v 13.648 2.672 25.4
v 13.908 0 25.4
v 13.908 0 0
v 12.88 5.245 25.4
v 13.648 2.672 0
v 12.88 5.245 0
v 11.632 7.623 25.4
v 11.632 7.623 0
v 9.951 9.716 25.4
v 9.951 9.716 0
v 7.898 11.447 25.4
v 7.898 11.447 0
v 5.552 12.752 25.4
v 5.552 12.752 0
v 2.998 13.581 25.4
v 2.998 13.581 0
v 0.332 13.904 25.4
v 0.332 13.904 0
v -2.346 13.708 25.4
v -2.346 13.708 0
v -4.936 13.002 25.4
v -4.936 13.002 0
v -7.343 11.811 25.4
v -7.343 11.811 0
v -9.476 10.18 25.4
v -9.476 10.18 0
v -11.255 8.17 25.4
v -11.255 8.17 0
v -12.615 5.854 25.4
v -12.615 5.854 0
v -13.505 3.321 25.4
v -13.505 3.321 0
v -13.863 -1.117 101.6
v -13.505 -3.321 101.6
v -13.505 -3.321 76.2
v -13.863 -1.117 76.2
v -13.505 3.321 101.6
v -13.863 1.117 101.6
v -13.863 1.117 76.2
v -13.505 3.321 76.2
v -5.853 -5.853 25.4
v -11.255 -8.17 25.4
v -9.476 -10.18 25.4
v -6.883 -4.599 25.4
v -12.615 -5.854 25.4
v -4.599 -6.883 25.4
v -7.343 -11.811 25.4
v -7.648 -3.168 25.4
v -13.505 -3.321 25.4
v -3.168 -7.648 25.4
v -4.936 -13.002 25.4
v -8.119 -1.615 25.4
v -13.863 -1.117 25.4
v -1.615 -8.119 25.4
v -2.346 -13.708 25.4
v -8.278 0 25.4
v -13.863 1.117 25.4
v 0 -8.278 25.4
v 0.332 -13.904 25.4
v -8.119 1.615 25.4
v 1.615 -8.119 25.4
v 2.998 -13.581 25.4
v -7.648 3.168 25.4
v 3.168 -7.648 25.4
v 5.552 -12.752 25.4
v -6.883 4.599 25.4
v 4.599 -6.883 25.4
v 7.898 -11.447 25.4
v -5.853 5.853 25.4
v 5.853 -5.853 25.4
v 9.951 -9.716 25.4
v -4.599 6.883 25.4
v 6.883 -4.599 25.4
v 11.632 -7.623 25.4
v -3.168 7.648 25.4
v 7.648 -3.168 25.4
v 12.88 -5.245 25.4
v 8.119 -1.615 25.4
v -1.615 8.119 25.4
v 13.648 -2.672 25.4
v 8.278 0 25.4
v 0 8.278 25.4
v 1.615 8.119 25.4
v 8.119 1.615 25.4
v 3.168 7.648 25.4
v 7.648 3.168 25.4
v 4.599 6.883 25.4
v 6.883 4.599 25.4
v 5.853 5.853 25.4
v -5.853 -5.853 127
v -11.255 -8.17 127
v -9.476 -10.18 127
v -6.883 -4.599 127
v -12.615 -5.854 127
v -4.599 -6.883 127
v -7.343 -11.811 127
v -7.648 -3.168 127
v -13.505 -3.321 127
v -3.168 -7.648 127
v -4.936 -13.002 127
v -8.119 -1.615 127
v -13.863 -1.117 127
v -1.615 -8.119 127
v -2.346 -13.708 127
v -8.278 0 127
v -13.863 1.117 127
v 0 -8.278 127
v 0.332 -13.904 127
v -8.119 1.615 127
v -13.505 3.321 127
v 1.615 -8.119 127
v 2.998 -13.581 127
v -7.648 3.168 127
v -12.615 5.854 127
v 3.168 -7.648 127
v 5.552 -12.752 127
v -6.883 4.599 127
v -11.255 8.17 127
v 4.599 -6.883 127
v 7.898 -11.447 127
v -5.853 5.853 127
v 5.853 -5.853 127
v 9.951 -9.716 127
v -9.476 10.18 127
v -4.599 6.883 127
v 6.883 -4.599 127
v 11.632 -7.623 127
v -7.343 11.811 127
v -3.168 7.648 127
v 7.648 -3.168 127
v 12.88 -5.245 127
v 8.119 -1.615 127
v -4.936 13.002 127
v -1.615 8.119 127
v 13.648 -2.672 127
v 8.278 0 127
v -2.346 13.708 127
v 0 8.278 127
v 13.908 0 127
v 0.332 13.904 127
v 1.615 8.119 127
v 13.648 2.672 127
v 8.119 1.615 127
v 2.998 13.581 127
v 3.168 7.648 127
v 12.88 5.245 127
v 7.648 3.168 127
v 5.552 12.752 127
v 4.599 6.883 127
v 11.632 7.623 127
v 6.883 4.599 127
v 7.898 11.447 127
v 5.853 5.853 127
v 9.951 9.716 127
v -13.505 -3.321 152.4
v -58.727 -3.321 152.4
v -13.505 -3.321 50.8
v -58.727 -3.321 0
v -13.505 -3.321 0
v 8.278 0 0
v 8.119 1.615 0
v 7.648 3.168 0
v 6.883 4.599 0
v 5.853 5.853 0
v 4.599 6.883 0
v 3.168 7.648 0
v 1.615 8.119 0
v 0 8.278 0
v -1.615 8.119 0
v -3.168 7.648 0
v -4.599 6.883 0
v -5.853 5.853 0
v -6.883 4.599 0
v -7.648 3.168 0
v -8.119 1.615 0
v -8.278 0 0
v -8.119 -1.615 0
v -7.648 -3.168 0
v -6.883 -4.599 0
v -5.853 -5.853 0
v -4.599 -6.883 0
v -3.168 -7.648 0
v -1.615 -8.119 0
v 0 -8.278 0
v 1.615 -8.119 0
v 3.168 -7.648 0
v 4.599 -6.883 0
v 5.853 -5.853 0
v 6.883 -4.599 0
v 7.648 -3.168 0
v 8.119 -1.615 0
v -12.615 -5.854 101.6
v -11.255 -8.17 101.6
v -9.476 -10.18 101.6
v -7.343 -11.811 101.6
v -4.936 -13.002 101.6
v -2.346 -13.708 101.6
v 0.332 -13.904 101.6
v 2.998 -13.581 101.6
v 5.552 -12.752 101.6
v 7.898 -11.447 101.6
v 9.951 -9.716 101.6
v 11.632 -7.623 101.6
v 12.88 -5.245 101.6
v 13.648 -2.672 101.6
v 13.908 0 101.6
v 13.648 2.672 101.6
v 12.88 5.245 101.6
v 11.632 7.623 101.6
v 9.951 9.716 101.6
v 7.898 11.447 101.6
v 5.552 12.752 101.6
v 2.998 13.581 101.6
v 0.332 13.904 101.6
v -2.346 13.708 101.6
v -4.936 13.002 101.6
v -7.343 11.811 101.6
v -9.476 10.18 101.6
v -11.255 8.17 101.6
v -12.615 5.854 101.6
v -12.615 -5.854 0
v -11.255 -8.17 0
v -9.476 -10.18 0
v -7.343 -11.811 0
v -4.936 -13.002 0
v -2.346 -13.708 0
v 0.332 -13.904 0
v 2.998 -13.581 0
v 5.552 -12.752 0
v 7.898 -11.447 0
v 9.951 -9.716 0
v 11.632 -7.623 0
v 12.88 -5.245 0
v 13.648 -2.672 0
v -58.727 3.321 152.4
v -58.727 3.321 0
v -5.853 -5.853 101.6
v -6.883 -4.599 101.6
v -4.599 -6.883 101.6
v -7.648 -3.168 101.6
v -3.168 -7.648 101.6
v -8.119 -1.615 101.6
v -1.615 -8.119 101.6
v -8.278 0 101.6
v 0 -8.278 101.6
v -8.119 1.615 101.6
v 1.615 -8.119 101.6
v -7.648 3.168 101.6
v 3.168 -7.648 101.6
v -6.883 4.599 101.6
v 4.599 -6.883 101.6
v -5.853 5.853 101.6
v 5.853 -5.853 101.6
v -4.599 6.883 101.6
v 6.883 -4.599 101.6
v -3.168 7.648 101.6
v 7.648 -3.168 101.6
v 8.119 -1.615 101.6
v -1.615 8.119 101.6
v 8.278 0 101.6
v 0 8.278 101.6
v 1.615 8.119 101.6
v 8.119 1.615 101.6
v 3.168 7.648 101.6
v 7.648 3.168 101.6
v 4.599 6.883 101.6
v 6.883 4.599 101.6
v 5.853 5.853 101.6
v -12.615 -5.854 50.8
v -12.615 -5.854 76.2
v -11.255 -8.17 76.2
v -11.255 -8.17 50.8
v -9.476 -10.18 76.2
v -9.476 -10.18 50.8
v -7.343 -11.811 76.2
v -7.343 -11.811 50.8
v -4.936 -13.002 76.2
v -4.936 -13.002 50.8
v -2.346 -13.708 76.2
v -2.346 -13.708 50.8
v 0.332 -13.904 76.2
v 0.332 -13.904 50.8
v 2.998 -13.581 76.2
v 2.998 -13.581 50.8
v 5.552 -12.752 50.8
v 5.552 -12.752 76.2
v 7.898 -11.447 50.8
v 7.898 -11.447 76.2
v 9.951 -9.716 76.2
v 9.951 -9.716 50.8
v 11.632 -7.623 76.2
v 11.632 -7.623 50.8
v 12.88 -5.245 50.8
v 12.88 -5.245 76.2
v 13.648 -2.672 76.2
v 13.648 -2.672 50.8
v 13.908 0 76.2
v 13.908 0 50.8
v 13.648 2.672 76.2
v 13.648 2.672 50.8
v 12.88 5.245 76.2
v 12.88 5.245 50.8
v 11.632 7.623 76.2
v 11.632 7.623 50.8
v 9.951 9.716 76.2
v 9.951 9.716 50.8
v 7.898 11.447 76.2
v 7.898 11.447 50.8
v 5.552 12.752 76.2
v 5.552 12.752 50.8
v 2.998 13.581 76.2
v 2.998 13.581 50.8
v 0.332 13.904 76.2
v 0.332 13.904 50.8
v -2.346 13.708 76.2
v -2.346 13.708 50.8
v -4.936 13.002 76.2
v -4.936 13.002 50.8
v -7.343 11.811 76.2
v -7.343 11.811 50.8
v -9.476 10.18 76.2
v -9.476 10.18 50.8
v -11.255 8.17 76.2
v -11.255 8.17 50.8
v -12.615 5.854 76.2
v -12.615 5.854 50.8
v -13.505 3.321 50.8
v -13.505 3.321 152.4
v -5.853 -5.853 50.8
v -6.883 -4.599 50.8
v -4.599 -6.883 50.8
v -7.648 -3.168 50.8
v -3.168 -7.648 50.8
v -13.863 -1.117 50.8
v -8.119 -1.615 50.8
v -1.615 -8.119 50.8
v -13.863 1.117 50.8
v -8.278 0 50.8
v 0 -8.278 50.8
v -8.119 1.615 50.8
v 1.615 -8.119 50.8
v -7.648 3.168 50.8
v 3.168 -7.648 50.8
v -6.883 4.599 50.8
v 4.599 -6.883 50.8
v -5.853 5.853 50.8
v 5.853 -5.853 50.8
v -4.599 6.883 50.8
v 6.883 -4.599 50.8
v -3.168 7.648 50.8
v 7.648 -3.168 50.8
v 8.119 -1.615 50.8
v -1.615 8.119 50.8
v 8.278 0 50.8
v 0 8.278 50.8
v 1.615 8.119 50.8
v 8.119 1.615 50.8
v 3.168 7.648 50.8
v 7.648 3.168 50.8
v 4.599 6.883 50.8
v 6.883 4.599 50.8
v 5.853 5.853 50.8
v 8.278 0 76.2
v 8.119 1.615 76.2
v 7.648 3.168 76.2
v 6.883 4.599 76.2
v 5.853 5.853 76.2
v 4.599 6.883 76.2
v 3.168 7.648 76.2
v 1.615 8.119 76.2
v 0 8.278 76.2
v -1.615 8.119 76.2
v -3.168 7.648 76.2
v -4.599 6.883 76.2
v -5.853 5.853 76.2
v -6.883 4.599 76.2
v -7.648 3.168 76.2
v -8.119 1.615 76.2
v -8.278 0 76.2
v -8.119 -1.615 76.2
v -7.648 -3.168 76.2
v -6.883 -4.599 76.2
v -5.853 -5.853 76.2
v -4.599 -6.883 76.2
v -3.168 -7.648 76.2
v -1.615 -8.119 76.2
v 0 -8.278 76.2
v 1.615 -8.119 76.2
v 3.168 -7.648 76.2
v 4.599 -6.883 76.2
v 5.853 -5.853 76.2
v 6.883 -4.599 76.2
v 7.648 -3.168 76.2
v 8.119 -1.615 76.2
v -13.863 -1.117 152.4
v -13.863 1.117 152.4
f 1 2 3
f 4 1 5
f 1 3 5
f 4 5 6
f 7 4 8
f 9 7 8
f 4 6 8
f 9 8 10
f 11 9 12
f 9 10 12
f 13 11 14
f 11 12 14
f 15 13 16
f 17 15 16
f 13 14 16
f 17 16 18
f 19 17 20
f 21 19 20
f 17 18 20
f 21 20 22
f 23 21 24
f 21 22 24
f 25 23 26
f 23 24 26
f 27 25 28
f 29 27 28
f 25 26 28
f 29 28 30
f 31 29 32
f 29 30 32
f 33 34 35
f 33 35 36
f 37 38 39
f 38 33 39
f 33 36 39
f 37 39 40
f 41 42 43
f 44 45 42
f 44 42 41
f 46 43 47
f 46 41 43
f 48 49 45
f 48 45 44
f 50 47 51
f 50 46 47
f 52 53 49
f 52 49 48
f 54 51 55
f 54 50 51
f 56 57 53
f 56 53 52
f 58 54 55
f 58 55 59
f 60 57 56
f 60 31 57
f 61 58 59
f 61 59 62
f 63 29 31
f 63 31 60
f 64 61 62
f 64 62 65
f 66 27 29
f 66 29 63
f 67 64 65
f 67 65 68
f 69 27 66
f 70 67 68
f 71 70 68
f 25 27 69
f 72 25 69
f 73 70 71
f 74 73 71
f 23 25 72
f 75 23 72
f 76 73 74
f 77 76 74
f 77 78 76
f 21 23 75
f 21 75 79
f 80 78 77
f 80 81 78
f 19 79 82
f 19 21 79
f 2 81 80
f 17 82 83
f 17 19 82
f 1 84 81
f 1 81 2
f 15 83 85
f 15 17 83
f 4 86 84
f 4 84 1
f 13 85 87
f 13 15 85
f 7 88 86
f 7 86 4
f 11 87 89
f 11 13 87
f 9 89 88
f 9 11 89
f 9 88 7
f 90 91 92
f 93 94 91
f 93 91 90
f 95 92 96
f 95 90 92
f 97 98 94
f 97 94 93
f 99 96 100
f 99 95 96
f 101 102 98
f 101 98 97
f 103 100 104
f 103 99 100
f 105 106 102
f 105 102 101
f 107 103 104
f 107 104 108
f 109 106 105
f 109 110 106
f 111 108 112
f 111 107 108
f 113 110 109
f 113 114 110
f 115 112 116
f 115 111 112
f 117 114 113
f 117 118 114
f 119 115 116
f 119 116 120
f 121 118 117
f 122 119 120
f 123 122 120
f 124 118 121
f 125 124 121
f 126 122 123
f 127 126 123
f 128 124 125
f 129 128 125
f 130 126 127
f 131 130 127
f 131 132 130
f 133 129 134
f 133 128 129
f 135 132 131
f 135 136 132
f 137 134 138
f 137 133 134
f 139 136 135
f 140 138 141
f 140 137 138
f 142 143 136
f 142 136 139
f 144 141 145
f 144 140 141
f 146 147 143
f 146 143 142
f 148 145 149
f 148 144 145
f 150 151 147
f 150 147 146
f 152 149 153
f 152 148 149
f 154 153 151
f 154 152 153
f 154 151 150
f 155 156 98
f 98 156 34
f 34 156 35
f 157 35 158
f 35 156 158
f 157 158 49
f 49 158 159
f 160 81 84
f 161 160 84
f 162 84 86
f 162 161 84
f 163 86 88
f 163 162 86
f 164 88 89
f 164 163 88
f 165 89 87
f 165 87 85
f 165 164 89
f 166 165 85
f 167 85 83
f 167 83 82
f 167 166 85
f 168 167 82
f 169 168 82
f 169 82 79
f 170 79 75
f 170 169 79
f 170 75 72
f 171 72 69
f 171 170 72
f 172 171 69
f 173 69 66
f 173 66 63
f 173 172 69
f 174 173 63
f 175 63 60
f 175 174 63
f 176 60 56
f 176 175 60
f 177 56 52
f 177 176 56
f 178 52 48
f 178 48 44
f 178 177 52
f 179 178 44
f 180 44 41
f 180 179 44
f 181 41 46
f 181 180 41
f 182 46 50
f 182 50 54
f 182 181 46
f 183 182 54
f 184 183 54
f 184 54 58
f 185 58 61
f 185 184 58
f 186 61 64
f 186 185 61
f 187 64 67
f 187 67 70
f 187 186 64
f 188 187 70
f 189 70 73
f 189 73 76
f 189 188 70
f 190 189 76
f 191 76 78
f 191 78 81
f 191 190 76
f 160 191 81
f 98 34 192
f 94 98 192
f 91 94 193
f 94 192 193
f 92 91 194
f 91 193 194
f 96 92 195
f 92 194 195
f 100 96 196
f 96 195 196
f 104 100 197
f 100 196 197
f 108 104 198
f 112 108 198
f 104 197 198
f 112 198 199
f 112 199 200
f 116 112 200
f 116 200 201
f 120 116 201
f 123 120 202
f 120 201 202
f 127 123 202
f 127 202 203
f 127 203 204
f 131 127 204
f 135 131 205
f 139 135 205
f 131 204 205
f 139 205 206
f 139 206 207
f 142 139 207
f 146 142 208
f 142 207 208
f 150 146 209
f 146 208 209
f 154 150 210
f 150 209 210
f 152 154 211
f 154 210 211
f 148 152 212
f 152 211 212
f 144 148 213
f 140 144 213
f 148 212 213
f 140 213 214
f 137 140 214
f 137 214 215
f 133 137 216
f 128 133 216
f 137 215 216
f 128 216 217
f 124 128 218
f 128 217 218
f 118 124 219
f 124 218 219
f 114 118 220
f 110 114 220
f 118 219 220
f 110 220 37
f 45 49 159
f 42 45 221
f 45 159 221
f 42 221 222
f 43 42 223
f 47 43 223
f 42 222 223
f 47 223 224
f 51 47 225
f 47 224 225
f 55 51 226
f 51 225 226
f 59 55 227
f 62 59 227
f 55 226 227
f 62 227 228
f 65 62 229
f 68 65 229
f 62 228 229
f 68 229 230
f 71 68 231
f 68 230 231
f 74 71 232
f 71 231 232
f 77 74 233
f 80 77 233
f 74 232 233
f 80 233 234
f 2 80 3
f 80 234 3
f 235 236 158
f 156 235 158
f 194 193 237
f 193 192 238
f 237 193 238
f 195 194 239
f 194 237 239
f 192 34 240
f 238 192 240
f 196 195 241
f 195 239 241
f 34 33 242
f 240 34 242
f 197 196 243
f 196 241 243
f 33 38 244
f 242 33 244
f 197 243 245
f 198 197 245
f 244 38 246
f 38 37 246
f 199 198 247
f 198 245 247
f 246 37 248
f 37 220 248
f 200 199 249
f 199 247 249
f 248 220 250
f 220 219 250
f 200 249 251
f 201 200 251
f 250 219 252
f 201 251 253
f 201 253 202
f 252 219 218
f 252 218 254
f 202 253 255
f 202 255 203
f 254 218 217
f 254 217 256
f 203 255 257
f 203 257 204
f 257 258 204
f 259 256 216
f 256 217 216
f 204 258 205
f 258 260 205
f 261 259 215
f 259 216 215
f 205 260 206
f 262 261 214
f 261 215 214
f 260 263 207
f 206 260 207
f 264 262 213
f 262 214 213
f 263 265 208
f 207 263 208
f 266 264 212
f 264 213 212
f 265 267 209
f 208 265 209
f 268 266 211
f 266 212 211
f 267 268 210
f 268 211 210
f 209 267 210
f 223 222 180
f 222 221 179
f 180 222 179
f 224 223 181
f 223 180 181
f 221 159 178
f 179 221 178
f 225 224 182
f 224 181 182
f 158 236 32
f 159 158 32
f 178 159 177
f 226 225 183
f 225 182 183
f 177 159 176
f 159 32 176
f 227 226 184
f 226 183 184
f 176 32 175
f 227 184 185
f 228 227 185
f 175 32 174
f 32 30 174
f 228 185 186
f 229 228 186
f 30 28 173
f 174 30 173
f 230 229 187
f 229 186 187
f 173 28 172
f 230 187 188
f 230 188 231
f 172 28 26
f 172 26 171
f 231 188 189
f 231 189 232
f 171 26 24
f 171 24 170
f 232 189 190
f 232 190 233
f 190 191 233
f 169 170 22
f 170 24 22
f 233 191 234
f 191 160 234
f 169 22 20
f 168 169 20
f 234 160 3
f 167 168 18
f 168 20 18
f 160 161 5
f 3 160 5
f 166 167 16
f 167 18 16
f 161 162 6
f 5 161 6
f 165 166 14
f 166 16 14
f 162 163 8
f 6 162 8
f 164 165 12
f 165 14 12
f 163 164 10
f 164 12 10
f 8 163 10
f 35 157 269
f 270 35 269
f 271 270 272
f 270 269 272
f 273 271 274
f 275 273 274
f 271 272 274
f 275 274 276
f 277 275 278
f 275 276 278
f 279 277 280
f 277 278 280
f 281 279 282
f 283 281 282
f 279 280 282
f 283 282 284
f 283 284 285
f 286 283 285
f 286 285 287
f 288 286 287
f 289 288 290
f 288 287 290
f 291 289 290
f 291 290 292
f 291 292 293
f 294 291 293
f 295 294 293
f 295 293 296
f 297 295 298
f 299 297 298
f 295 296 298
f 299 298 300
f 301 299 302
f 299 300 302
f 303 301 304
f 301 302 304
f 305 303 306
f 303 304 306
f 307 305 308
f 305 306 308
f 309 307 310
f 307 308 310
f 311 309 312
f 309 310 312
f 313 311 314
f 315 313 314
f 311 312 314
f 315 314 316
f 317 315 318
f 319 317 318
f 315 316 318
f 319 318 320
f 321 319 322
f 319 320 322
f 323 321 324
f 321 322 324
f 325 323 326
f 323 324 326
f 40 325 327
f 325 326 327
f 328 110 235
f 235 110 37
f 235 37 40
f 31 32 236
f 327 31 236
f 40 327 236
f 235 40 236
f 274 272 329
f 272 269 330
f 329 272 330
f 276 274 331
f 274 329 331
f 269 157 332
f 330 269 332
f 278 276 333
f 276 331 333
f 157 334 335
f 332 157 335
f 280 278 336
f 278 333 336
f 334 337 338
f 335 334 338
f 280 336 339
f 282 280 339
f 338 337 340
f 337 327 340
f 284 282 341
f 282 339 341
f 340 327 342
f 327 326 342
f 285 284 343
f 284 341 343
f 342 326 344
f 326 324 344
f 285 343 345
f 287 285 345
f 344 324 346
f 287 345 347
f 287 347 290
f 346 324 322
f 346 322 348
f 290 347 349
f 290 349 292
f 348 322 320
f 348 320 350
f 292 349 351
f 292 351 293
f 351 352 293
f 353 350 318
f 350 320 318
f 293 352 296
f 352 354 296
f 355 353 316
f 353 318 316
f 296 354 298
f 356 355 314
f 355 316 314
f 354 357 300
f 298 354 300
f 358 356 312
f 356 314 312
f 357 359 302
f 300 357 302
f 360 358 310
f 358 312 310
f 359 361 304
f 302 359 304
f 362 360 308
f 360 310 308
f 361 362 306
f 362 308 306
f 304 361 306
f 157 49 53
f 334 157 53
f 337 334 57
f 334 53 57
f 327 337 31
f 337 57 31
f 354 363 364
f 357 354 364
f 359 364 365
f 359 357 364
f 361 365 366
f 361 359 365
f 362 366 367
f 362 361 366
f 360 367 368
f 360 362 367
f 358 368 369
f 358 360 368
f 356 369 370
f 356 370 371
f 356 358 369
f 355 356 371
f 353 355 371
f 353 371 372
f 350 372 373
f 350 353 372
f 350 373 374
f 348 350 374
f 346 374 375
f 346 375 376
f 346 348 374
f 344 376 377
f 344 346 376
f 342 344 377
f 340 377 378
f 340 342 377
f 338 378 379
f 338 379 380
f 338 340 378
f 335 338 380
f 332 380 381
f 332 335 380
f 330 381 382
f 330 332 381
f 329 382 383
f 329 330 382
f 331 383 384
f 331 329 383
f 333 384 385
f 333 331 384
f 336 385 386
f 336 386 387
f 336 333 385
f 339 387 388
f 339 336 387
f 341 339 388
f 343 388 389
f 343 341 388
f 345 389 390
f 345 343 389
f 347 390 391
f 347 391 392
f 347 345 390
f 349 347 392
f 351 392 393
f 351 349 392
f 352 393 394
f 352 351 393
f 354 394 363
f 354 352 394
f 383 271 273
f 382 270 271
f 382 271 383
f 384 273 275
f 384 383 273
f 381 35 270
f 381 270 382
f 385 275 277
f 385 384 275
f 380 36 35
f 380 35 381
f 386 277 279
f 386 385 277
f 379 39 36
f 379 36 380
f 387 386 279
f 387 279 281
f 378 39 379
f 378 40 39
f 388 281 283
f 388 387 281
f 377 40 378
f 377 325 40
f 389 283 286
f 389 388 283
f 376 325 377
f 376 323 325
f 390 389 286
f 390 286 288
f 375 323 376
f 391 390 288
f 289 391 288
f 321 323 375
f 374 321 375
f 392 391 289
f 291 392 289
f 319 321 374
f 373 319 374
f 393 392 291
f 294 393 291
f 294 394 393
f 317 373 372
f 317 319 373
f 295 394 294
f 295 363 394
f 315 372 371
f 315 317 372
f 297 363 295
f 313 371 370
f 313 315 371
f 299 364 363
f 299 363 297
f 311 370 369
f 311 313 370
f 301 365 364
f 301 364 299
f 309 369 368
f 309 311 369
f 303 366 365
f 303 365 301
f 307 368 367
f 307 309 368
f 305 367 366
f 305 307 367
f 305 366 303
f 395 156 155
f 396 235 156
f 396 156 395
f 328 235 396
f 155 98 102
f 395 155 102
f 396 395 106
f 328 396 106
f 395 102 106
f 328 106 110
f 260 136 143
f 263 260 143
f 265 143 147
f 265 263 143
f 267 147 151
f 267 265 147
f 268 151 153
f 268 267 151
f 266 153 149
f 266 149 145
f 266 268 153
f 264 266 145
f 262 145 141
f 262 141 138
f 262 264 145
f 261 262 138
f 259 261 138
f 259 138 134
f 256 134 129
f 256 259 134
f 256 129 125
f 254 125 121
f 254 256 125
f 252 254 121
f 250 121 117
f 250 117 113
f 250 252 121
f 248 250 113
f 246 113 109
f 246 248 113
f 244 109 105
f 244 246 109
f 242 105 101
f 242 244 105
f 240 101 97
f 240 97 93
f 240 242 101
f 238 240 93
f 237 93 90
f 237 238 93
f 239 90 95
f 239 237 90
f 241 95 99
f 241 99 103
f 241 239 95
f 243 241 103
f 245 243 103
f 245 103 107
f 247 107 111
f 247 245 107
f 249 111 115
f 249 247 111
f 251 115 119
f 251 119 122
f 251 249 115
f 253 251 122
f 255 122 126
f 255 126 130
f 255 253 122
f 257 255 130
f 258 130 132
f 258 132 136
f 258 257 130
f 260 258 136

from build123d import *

# Parameters (mm, degrees)
F1_DEPTH = 152.4
F0_R     = 8.277939
F2_DEPTH = 25.4
F5_R     = 8.277939
F6_DEPTH = 25.4
F7_R     = 8.277939
F8_DEPTH = 25.4


with BuildPart() as f1:
    # F0 (on Top) → F1 (new body)
    with BuildSketch(Plane.XY):
        with BuildLine():
            ThreePointArc((-13.505174, -3.321212), (-13.907558, 0), (-13.505174, 3.321212))
            Line((-13.505174, 3.321212), (-58.726565, 3.321212))
            Line((-58.726565, 3.321212), (-58.726565, -3.321212))
            Line((-58.726565, -3.321212), (-13.505174, -3.321212))
        make_face()
    extrude(amount=F1_DEPTH)

    # F0 (on Top) → F2 (join)
    with BuildSketch(Plane.XY):
        with BuildLine():
            ThreePointArc((13.907558, 0), (1.672749, 13.806595), (-13.505174, 3.321212))
            ThreePointArc((-13.505174, 3.321212), (-13.907558, 0), (-13.505174, -3.321212))
            ThreePointArc((-13.505174, -3.321212), (1.672749, -13.806595), (13.907558, 0))
        make_face()
        Circle(F0_R, mode=Mode.SUBTRACT)
    extrude(amount=F2_DEPTH)

    # F5 (on offset) → F6 (join)
    with BuildSketch(Plane.XY.offset(50.8)):
        with BuildLine():
            ThreePointArc((-13.505174, -3.321212), (13.907558, 0), (-13.505174, 3.321212))
            ThreePointArc((-13.505174, 3.321212), (-13.907558, 0), (-13.505174, -3.321212))
        make_face()
        Circle(F5_R, mode=Mode.SUBTRACT)
    extrude(amount=F6_DEPTH)

    # F7 (on offset) → F8 (join)
    with BuildSketch(Plane.XY.offset(101.6)):
        with BuildLine():
            ThreePointArc((-13.505174, -3.321212), (13.907558, 0), (-13.505174, 3.321212))
            ThreePointArc((-13.505174, 3.321212), (-13.907558, 0), (-13.505174, -3.321212))
        make_face()
        Circle(F7_R, mode=Mode.SUBTRACT)
    extrude(amount=F8_DEPTH)


solid = f1.part
